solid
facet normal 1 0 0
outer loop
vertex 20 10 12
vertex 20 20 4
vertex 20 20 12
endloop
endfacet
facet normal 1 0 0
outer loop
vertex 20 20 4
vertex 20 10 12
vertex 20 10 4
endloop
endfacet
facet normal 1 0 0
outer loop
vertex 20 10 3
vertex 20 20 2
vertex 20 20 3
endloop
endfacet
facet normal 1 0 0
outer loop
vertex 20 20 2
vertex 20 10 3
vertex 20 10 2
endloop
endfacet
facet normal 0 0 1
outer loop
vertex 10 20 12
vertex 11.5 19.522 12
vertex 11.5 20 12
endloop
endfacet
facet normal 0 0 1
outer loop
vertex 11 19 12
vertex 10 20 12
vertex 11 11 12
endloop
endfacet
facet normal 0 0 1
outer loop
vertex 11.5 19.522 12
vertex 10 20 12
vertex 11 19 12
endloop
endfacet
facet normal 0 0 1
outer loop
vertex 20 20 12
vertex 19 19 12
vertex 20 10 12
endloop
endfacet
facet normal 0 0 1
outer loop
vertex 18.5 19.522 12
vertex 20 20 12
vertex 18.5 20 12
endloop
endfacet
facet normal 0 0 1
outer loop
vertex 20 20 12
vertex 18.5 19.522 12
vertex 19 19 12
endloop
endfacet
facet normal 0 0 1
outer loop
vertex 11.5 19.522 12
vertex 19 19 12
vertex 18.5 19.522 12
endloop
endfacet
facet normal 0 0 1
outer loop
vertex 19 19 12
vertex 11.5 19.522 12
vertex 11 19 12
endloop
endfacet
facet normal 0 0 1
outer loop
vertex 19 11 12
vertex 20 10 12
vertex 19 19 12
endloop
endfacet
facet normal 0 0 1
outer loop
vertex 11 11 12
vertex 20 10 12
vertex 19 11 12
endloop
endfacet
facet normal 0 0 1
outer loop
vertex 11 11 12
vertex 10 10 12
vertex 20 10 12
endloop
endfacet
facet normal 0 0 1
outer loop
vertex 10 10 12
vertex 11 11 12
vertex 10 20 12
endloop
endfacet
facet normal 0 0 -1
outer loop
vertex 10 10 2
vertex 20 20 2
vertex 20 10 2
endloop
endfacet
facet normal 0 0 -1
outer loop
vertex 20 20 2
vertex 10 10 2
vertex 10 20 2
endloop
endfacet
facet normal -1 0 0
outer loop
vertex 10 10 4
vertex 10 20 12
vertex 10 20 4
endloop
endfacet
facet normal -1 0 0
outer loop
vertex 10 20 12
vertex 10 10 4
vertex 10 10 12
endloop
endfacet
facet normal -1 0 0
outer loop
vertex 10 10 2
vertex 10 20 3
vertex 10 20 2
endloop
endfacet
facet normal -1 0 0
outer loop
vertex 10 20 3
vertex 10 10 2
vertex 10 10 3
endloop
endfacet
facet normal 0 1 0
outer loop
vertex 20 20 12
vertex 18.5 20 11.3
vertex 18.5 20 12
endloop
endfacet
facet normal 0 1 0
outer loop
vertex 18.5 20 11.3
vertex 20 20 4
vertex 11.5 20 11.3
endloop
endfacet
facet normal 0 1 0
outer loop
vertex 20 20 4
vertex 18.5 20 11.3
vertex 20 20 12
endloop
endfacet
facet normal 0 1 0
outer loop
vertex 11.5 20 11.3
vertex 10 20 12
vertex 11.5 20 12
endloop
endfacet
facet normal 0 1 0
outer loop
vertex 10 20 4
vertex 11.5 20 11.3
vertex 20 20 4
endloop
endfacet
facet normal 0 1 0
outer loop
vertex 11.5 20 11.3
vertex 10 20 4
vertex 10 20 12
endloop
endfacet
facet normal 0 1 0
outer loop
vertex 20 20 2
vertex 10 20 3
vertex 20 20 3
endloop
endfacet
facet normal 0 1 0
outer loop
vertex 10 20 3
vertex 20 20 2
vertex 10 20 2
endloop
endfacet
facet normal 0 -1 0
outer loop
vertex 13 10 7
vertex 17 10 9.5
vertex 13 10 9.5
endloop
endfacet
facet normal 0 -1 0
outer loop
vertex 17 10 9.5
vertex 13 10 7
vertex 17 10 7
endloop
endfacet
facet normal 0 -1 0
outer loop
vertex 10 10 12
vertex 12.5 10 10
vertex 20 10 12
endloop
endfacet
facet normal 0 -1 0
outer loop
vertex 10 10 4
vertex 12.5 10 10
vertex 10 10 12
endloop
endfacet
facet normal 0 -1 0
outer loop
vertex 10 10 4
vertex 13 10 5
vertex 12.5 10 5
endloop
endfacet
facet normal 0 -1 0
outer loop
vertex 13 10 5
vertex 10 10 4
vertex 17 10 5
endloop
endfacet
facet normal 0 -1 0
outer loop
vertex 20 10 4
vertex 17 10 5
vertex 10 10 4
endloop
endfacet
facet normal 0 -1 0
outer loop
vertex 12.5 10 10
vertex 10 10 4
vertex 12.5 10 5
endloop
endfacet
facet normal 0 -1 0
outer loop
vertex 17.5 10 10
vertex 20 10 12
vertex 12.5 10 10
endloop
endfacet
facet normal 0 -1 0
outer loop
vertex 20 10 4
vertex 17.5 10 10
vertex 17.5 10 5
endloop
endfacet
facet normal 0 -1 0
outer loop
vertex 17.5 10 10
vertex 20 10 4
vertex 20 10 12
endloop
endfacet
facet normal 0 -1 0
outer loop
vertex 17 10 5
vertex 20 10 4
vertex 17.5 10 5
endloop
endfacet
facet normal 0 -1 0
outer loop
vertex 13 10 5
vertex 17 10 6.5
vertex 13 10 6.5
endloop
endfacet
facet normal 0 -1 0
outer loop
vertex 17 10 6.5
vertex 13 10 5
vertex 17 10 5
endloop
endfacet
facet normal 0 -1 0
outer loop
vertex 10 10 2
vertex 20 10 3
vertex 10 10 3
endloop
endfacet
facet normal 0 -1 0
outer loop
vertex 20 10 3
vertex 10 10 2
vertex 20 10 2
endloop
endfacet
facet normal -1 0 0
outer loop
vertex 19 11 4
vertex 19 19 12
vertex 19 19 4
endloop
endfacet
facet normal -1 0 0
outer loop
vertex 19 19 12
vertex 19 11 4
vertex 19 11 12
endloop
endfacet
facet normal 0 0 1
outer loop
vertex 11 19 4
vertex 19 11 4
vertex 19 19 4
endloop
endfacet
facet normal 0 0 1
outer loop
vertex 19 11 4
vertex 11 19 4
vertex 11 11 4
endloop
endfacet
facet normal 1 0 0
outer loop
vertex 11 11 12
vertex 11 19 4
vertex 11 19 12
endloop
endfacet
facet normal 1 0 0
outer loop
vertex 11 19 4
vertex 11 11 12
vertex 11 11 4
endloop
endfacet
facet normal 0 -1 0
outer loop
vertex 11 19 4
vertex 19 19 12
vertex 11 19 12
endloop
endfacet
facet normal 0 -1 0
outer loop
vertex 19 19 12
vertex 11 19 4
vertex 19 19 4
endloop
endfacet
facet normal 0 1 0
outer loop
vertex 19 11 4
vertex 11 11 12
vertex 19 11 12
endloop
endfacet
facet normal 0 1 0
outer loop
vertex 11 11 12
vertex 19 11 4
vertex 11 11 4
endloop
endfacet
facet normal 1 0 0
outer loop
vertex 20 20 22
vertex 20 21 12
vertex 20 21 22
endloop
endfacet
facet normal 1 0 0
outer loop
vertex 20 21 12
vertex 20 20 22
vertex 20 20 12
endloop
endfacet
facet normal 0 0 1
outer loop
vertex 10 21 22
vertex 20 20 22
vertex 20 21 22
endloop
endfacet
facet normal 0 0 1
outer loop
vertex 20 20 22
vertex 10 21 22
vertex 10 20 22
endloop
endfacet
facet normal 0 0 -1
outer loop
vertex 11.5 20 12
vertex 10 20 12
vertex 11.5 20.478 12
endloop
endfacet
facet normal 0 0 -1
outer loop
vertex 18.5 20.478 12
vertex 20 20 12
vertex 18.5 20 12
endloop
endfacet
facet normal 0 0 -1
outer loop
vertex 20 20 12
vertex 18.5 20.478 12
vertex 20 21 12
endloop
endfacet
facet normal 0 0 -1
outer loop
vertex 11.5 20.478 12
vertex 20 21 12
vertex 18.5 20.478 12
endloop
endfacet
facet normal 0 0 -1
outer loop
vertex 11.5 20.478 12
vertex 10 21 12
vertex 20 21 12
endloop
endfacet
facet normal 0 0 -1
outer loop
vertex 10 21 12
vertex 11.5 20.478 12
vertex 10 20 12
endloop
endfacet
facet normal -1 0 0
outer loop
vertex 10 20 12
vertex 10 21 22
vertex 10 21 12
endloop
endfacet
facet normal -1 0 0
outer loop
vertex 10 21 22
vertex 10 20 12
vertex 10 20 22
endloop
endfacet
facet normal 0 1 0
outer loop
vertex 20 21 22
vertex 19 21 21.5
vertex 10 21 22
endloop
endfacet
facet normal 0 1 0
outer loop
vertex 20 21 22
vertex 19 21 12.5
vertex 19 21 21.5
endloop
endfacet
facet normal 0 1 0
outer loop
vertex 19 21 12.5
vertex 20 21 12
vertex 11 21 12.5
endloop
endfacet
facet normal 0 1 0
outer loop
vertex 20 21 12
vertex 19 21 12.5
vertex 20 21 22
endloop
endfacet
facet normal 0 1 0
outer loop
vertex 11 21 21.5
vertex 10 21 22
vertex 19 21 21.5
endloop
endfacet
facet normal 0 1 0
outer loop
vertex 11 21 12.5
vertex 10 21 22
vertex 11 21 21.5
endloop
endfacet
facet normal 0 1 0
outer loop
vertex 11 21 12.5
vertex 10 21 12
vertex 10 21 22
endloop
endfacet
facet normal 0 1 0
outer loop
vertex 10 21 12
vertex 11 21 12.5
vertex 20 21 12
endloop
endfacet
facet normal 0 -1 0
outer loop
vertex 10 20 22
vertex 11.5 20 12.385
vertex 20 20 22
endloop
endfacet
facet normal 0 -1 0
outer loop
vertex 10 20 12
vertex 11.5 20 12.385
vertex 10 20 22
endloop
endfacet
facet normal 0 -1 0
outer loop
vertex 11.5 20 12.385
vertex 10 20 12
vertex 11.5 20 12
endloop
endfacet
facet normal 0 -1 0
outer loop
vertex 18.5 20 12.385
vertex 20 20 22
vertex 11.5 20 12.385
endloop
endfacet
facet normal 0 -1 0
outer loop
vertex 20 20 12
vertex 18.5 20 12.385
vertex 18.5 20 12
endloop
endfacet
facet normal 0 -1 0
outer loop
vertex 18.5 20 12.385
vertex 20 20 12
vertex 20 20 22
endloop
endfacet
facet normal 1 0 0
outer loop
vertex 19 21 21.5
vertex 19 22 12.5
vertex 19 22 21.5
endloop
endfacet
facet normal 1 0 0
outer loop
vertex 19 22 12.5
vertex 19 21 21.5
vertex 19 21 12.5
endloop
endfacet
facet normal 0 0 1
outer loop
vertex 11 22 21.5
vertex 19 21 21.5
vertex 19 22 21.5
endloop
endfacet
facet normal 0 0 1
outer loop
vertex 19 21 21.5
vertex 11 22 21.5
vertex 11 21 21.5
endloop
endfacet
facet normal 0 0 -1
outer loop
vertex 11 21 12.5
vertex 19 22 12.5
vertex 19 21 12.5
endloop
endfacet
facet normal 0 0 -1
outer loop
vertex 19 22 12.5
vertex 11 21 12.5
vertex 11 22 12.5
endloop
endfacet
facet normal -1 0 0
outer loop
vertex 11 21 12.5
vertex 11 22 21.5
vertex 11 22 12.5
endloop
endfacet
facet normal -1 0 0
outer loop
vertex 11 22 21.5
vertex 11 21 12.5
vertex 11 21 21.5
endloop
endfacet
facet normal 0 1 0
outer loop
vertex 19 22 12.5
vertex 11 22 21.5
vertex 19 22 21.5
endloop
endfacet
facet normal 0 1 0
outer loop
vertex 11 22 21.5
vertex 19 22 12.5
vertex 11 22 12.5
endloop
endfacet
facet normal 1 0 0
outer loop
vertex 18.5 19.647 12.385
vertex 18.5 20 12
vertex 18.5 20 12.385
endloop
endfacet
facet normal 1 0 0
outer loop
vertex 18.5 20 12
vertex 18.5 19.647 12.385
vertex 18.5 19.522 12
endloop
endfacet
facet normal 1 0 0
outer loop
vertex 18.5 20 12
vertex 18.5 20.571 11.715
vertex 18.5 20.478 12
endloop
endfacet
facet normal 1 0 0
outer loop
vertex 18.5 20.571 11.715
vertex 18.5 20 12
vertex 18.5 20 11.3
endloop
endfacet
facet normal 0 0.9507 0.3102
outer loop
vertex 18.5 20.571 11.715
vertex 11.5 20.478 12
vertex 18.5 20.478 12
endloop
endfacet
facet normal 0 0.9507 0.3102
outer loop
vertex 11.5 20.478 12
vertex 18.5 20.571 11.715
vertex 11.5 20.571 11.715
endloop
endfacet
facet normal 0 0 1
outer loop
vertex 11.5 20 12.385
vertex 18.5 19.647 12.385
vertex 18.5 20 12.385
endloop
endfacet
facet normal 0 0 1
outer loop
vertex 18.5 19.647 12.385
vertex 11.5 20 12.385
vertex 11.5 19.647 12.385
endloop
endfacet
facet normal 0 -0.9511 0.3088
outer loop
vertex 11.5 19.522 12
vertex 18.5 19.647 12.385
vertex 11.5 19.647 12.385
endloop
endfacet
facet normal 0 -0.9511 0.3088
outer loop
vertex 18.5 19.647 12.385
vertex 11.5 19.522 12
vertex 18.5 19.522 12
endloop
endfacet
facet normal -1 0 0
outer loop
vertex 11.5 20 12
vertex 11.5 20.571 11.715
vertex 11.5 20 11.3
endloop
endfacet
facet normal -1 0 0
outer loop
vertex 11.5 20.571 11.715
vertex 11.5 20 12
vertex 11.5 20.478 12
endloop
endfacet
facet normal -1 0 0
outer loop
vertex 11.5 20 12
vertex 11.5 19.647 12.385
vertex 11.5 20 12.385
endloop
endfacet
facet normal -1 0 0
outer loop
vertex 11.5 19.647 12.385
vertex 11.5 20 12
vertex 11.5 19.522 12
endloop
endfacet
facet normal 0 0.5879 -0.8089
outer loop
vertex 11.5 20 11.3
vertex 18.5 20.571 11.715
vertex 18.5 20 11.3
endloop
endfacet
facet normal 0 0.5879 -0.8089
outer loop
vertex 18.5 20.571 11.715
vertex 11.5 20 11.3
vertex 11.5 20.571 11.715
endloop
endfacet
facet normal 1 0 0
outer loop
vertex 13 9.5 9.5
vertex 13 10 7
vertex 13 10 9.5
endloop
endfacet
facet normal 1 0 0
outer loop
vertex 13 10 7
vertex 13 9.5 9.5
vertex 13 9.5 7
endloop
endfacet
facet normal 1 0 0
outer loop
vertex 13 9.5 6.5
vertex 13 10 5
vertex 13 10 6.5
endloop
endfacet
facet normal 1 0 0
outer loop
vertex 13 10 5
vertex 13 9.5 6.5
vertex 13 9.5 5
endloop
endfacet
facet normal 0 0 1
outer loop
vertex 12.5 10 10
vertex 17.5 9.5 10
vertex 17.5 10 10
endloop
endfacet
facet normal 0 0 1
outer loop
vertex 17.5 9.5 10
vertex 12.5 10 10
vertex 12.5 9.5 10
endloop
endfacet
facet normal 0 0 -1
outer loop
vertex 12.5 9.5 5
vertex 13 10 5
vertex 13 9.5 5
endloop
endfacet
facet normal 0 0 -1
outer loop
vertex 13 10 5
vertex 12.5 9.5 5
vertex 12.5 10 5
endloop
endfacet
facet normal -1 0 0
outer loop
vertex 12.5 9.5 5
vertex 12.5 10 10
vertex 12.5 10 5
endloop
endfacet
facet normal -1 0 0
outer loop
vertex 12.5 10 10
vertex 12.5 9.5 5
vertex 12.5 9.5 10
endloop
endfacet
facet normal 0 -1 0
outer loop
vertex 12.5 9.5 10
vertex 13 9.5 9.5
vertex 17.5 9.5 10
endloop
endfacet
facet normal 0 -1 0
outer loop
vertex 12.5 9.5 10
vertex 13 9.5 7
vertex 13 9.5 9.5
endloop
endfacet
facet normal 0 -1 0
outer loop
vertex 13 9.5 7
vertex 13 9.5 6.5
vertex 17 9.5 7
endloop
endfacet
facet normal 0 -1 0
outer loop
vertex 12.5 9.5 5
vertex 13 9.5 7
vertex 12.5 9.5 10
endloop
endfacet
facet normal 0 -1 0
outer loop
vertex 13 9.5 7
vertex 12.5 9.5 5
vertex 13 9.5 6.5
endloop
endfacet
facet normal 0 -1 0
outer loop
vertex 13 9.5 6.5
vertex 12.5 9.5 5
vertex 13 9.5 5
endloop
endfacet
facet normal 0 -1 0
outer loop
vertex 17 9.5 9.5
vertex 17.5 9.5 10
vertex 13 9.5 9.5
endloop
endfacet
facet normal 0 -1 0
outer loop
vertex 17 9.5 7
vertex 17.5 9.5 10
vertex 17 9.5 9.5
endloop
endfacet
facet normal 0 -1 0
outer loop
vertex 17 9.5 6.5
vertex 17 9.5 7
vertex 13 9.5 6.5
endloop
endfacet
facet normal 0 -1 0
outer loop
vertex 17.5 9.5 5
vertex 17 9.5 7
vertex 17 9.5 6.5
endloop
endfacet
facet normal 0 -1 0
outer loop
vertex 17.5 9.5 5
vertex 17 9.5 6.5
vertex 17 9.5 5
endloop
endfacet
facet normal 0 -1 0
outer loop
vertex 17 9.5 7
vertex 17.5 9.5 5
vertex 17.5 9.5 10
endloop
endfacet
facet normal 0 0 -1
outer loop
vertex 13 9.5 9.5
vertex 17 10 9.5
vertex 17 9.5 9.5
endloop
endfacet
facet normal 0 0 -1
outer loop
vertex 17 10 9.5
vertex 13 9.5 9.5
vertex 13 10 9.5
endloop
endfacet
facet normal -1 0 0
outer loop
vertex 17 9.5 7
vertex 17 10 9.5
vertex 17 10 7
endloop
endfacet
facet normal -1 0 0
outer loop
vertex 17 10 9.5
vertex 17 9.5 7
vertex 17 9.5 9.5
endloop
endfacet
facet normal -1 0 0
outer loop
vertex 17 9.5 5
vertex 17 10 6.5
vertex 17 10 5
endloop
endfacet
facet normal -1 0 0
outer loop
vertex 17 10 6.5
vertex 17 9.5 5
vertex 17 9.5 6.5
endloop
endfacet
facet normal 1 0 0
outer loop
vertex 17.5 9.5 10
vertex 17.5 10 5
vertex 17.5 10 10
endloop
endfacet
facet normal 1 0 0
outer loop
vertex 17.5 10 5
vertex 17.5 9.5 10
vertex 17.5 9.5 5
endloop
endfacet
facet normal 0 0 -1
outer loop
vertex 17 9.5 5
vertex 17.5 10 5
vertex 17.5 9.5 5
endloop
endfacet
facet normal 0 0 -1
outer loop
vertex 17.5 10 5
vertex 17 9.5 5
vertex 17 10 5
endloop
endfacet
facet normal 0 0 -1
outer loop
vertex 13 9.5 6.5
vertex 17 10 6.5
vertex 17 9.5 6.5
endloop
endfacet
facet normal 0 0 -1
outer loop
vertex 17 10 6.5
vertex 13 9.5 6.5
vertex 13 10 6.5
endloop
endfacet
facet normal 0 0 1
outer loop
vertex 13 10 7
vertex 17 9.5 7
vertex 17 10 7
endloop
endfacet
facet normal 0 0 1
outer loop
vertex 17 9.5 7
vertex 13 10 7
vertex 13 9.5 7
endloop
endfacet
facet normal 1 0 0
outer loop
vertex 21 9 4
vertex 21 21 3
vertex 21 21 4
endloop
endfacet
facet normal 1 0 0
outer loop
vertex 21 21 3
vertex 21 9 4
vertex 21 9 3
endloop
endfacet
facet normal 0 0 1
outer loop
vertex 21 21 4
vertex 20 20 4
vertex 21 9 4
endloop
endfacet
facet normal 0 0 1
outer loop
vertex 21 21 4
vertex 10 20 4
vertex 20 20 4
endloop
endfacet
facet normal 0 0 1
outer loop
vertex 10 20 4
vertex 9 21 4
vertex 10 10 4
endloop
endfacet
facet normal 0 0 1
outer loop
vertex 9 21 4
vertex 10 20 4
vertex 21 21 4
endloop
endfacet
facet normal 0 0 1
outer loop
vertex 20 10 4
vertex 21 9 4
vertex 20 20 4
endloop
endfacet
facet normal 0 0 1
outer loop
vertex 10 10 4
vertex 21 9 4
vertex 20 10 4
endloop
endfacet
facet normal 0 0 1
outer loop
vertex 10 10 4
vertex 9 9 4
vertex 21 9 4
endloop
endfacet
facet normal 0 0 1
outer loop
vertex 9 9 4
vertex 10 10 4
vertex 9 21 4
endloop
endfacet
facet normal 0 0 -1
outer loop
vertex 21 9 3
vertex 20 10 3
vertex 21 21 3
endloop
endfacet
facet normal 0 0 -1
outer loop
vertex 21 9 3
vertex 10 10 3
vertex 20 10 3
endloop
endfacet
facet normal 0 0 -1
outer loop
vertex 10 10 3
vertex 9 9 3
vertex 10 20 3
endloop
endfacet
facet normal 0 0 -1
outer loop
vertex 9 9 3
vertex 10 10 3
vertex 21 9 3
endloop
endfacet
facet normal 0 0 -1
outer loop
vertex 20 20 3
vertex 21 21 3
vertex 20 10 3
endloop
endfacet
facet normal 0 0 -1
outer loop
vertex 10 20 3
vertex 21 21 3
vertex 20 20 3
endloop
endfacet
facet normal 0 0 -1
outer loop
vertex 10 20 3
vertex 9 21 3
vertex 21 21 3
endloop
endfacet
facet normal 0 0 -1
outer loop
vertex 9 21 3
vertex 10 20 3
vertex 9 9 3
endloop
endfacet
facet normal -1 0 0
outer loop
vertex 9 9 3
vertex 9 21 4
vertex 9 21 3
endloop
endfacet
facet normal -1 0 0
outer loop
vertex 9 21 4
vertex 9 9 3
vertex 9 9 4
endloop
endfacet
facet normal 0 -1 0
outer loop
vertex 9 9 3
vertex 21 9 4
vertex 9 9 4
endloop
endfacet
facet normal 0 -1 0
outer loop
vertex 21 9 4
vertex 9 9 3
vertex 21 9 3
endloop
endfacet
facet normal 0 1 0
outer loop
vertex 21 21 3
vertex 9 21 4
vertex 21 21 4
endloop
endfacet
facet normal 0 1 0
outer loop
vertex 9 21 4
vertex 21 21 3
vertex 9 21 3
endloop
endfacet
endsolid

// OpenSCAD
// Modelagem de uma caixinha no OpenSCAD

translate([10, 10, 0]){
    translate([0, 0, 2]){
        difference(){
            color ("black")
            cube([10, 10, 10]);
            translate([1, 1, 2])
                color ("pink")
                cube([8, 8, 10]);  
        }       
    }
    union(){
        translate([0, 10, 12]){
            color("magenta")
            rotate([0, 0, 0])
            cube([10, 1, 10]);
        }
        translate([1, 11, 12.5]){
            color("pink")
            rotate([0, 0, 0])
            cube([8, 1, 9]);
        }
    }
    translate([1.5, 10, 11.9]){
        color ("pink")
        rotate([0, 90, 0])        
        cylinder(r = 0.6, h = 7);
        }
    translate([2.5, -0.5, 5]){
        color ("magenta")    
        rotate([0, 0, 0])
        cube([0.5, 0.5, 5]);
    }
    translate([3, -0.5, 10]){
        color ("magenta")
        rotate([0, 90, 0])
        cube([0.5, 0.5, 4]);
    }
    translate([7, -0.5, 5]){
        color ("magenta")
        rotate([0, 0, 0])
        cube([0.5, 0.5, 5]);
    }
    translate([3, -0.5, 7]){
        color ("magenta")
        rotate([0, 90, 0])
        cube([0.5, 0.5, 4]);
    }
    translate([-1, -1, 3]){
        color ("pink")
        cube([12, 1, 1]);
    }
    translate([-1, -1, 3]){
        color ("pink")
        cube([1, 12, 1]);
    }
    translate([-1, 10, 3]){
        color ("pink")
        cube([12, 1, 1]);
    }
    translate([10, -1, 3]){
        color ("pink")
        cube([1, 12, 1]);
    }
    
    
}
